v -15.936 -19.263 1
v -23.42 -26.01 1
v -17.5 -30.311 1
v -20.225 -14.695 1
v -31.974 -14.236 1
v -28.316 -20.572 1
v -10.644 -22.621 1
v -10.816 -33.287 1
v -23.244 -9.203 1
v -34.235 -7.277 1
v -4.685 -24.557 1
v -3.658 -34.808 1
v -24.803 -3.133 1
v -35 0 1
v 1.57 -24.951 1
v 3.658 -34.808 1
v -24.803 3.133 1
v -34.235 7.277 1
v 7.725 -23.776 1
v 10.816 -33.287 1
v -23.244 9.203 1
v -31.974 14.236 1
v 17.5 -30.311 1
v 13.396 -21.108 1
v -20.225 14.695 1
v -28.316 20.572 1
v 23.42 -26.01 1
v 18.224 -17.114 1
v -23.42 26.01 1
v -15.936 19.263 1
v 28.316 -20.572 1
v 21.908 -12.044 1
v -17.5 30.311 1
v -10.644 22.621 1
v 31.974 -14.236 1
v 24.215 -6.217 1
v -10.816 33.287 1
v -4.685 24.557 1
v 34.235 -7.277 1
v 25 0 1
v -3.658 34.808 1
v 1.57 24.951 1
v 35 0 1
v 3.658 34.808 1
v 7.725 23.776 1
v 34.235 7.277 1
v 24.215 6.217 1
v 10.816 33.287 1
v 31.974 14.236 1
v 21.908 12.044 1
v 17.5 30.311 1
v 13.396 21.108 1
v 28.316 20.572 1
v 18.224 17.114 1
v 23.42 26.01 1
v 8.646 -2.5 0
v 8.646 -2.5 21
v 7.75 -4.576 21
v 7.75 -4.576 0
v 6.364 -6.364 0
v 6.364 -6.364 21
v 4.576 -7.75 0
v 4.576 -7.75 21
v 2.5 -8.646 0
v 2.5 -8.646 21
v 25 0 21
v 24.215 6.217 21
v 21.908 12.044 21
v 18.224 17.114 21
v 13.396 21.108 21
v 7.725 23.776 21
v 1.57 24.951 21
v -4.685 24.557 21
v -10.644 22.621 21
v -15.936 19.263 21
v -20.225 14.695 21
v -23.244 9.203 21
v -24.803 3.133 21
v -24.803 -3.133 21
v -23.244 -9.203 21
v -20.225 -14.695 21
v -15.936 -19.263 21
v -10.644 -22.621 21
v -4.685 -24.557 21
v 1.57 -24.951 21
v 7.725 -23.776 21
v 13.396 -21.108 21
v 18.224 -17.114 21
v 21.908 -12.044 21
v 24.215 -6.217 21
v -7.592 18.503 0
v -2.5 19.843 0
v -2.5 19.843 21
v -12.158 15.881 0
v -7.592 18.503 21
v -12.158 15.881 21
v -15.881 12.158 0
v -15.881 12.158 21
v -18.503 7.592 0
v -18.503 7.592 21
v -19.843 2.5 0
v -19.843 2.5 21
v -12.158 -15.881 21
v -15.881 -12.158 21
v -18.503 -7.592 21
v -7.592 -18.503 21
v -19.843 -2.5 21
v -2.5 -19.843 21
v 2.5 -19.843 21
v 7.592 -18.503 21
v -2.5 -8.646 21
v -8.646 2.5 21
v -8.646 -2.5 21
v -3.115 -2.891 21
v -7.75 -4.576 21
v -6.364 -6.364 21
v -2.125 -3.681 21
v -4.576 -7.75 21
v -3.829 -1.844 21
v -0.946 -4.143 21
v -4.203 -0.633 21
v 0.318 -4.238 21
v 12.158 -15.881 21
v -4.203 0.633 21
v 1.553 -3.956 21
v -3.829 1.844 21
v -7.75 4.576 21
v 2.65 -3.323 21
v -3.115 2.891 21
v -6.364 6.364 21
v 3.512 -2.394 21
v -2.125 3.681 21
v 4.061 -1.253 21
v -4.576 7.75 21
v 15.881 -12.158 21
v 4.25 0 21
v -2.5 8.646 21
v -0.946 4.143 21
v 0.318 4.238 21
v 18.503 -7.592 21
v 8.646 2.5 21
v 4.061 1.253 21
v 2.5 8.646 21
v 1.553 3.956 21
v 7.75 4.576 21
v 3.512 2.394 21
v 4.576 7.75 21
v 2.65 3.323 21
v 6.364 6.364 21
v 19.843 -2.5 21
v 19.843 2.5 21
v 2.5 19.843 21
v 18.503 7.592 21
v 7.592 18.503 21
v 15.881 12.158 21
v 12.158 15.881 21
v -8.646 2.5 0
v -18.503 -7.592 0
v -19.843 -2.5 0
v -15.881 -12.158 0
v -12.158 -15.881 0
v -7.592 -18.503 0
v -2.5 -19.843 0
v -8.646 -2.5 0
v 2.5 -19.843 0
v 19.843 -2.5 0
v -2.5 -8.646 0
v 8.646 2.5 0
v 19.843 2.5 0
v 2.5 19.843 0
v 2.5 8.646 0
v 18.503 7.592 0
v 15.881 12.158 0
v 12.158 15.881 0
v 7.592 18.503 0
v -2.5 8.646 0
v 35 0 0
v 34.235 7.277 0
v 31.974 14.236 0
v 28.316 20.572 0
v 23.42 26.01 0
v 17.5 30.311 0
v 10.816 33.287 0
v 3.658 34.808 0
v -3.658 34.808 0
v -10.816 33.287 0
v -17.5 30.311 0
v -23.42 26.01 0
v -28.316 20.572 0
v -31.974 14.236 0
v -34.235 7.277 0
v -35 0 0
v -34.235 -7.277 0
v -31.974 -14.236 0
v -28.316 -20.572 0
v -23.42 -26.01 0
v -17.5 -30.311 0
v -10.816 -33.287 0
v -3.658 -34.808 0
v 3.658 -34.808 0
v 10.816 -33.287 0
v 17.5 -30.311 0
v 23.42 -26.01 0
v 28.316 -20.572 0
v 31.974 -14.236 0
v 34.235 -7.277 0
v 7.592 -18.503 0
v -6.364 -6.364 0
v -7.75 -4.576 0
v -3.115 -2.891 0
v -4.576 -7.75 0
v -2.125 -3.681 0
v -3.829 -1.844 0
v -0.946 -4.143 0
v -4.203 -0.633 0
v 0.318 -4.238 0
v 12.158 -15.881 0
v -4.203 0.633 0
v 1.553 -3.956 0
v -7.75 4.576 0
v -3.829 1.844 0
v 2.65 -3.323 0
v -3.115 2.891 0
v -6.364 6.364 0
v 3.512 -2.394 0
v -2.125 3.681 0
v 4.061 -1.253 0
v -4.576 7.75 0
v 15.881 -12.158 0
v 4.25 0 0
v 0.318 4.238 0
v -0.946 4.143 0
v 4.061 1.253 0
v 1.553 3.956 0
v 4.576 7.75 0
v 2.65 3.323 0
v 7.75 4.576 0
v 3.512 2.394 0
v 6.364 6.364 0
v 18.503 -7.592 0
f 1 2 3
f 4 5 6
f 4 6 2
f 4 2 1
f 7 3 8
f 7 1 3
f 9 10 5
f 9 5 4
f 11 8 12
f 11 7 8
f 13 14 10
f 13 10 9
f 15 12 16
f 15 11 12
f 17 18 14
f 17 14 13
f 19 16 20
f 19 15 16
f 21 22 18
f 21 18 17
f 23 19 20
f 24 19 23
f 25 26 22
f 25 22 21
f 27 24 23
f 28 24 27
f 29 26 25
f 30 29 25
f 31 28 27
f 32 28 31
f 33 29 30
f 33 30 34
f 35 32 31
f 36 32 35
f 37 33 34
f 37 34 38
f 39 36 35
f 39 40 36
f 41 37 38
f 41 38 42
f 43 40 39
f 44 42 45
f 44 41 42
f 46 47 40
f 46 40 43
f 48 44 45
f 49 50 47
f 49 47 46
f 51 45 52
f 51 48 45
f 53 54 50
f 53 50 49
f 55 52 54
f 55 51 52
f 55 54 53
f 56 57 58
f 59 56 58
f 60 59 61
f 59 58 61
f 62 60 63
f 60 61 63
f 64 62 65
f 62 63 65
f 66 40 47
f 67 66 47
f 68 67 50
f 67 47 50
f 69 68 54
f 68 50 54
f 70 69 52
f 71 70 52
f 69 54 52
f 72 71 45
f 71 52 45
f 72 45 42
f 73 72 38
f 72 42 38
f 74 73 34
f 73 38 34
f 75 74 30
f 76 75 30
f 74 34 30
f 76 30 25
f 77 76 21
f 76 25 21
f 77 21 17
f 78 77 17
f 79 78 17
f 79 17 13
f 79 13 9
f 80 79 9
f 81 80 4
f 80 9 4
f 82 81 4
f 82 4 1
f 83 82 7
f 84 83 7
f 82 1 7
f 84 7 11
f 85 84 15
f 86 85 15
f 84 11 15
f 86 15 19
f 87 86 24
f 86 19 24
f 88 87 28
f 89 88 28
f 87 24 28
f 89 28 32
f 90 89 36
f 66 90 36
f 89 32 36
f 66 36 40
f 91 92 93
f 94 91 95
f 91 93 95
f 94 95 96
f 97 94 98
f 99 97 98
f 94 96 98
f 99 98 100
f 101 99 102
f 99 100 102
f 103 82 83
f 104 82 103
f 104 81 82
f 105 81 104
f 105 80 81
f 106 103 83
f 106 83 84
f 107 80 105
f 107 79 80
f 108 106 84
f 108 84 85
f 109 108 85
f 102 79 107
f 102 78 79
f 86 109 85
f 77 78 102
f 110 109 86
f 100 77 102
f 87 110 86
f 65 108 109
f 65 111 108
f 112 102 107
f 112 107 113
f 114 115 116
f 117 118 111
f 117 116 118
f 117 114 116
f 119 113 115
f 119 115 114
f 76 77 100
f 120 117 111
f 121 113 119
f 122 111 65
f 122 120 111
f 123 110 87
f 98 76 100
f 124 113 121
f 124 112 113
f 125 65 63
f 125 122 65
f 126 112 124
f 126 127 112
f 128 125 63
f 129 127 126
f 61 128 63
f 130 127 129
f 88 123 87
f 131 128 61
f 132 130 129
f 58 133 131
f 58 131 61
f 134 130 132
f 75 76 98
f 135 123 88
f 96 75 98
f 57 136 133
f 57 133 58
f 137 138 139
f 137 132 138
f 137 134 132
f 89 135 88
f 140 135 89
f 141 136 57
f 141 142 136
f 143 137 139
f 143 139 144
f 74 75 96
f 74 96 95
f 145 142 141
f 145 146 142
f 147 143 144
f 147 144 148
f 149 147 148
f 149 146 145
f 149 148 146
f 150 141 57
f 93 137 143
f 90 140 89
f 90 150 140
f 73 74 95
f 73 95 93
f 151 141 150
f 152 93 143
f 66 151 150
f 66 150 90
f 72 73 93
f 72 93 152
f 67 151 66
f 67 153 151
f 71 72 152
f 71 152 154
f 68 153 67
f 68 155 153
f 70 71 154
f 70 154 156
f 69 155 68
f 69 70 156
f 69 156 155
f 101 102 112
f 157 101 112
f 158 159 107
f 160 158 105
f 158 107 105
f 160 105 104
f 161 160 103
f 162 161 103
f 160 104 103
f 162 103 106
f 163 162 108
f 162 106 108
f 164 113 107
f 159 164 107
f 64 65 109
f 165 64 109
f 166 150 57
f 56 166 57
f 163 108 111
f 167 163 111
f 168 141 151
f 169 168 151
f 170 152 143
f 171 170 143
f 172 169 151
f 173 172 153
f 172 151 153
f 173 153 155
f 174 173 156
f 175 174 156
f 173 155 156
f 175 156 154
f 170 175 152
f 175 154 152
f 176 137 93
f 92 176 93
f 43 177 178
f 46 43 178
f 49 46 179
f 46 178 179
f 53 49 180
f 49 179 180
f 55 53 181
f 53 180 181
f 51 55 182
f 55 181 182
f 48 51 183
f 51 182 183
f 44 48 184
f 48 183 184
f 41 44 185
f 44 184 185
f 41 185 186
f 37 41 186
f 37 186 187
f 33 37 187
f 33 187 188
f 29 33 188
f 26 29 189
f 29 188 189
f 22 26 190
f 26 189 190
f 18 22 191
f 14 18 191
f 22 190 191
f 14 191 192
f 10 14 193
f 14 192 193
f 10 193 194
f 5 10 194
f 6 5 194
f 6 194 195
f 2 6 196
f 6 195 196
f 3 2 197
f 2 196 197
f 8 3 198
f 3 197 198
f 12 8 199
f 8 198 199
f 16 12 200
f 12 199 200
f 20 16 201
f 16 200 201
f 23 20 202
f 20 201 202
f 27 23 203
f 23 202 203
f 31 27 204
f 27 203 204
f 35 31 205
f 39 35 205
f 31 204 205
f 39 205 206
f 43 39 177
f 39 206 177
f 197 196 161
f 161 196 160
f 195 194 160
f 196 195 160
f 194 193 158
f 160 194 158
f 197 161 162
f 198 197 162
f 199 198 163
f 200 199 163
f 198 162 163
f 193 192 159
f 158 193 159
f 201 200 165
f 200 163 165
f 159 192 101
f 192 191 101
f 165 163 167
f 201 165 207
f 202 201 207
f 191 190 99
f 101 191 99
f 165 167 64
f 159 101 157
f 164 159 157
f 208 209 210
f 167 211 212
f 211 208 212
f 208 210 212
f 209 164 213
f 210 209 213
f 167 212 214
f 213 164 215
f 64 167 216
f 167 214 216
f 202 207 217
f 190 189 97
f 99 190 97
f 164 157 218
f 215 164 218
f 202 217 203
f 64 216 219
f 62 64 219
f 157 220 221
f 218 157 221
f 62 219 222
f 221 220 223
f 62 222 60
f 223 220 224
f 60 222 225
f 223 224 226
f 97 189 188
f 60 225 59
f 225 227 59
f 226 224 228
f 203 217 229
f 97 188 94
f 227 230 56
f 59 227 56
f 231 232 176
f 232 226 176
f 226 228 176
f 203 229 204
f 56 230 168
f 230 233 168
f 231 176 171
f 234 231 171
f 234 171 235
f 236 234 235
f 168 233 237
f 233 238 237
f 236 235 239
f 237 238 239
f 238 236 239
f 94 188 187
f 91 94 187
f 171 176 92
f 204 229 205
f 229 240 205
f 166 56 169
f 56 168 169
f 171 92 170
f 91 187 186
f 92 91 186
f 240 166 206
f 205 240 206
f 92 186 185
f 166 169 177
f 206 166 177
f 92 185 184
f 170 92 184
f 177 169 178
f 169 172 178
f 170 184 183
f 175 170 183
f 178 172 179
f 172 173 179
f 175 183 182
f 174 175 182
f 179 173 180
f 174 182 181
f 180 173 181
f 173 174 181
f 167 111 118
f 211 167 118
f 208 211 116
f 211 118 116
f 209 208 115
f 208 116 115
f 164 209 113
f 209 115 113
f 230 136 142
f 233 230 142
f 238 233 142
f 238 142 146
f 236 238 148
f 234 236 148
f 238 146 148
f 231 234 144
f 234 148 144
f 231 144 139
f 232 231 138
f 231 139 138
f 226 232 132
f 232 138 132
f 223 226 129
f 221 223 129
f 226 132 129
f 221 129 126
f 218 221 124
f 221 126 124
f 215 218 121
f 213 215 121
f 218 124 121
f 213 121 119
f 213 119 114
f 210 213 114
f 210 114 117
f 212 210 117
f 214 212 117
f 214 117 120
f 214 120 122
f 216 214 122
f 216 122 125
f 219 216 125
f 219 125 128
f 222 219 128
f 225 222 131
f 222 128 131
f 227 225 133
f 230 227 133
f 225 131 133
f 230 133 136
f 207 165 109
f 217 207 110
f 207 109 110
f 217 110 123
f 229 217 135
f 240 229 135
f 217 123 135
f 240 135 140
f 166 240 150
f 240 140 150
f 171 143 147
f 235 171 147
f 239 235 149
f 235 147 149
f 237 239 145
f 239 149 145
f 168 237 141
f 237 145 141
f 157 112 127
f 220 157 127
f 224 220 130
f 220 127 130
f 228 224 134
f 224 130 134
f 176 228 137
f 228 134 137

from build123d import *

# Parameters (mm, degrees)
F0_R     = 35
F1_DEPTH = 1
F2_R     = 25
F3_DEPTH = 20
F4_R     = 4.25
F5_DEPTH = 21


with BuildPart() as f1:
    # F0 (on Top) → F1 (new body)
    with BuildSketch(Plane.XY):
        Circle(F0_R)
    extrude(amount=F1_DEPTH)

    # F2 (on face) → F3 (join)
    with BuildSketch(Plane.XY.offset(1)):
        Circle(F2_R)
    extrude(amount=F3_DEPTH)

    # F4 (on face) → F5 (cut, through all)
    with BuildSketch(Plane.XY.offset(21)):
        with BuildLine():
            ThreePointArc((-19.843134833, -2.5), (-14.1421356237, -14.1421356237), (-2.5, -19.843134833))
            Line((-2.5, -19.843134833), (-2.5, -8.6458082329))
            ThreePointArc((-2.5, -8.6458082329), (-6.3639610307, -6.3639610307), (-8.6458082329, -2.5))
            Line((-8.6458082329, -2.5), (-19.843134833, -2.5))
        make_face()
        with BuildLine():
            Line((-2.5, 8.6458082329), (-2.5, 19.843134833))
            ThreePointArc((-2.5, 19.843134833), (-14.1421356237, 14.1421356237), (-19.843134833, 2.5))
            Line((-19.843134833, 2.5), (-8.6458082329, 2.5))
            ThreePointArc((-8.6458082329, 2.5), (-6.3639610307, 6.3639610307), (-2.5, 8.6458082329))
        make_face()
        with BuildLine():
            Line((8.6458082329, 2.5), (19.843134833, 2.5))
            ThreePointArc((19.843134833, 2.5), (14.1421356237, 14.1421356237), (2.5, 19.843134833))
            Line((2.5, 19.843134833), (2.5, 8.6458082329))
            ThreePointArc((2.5, 8.6458082329), (6.3639610307, 6.3639610307), (8.6458082329, 2.5))
        make_face()
        with BuildLine():
            ThreePointArc((2.5, -19.843134833), (14.1421356237, -14.1421356237), (19.843134833, -2.5))
            Line((19.843134833, -2.5), (8.6458082329, -2.5))
            ThreePointArc((8.6458082329, -2.5), (6.3639610307, -6.3639610307), (2.5, -8.6458082329))
            Line((2.5, -8.6458082329), (2.5, -19.843134833))
        make_face()
        Circle(F4_R)
    extrude(amount=-F5_DEPTH, mode=Mode.SUBTRACT)


solid = f1.part
